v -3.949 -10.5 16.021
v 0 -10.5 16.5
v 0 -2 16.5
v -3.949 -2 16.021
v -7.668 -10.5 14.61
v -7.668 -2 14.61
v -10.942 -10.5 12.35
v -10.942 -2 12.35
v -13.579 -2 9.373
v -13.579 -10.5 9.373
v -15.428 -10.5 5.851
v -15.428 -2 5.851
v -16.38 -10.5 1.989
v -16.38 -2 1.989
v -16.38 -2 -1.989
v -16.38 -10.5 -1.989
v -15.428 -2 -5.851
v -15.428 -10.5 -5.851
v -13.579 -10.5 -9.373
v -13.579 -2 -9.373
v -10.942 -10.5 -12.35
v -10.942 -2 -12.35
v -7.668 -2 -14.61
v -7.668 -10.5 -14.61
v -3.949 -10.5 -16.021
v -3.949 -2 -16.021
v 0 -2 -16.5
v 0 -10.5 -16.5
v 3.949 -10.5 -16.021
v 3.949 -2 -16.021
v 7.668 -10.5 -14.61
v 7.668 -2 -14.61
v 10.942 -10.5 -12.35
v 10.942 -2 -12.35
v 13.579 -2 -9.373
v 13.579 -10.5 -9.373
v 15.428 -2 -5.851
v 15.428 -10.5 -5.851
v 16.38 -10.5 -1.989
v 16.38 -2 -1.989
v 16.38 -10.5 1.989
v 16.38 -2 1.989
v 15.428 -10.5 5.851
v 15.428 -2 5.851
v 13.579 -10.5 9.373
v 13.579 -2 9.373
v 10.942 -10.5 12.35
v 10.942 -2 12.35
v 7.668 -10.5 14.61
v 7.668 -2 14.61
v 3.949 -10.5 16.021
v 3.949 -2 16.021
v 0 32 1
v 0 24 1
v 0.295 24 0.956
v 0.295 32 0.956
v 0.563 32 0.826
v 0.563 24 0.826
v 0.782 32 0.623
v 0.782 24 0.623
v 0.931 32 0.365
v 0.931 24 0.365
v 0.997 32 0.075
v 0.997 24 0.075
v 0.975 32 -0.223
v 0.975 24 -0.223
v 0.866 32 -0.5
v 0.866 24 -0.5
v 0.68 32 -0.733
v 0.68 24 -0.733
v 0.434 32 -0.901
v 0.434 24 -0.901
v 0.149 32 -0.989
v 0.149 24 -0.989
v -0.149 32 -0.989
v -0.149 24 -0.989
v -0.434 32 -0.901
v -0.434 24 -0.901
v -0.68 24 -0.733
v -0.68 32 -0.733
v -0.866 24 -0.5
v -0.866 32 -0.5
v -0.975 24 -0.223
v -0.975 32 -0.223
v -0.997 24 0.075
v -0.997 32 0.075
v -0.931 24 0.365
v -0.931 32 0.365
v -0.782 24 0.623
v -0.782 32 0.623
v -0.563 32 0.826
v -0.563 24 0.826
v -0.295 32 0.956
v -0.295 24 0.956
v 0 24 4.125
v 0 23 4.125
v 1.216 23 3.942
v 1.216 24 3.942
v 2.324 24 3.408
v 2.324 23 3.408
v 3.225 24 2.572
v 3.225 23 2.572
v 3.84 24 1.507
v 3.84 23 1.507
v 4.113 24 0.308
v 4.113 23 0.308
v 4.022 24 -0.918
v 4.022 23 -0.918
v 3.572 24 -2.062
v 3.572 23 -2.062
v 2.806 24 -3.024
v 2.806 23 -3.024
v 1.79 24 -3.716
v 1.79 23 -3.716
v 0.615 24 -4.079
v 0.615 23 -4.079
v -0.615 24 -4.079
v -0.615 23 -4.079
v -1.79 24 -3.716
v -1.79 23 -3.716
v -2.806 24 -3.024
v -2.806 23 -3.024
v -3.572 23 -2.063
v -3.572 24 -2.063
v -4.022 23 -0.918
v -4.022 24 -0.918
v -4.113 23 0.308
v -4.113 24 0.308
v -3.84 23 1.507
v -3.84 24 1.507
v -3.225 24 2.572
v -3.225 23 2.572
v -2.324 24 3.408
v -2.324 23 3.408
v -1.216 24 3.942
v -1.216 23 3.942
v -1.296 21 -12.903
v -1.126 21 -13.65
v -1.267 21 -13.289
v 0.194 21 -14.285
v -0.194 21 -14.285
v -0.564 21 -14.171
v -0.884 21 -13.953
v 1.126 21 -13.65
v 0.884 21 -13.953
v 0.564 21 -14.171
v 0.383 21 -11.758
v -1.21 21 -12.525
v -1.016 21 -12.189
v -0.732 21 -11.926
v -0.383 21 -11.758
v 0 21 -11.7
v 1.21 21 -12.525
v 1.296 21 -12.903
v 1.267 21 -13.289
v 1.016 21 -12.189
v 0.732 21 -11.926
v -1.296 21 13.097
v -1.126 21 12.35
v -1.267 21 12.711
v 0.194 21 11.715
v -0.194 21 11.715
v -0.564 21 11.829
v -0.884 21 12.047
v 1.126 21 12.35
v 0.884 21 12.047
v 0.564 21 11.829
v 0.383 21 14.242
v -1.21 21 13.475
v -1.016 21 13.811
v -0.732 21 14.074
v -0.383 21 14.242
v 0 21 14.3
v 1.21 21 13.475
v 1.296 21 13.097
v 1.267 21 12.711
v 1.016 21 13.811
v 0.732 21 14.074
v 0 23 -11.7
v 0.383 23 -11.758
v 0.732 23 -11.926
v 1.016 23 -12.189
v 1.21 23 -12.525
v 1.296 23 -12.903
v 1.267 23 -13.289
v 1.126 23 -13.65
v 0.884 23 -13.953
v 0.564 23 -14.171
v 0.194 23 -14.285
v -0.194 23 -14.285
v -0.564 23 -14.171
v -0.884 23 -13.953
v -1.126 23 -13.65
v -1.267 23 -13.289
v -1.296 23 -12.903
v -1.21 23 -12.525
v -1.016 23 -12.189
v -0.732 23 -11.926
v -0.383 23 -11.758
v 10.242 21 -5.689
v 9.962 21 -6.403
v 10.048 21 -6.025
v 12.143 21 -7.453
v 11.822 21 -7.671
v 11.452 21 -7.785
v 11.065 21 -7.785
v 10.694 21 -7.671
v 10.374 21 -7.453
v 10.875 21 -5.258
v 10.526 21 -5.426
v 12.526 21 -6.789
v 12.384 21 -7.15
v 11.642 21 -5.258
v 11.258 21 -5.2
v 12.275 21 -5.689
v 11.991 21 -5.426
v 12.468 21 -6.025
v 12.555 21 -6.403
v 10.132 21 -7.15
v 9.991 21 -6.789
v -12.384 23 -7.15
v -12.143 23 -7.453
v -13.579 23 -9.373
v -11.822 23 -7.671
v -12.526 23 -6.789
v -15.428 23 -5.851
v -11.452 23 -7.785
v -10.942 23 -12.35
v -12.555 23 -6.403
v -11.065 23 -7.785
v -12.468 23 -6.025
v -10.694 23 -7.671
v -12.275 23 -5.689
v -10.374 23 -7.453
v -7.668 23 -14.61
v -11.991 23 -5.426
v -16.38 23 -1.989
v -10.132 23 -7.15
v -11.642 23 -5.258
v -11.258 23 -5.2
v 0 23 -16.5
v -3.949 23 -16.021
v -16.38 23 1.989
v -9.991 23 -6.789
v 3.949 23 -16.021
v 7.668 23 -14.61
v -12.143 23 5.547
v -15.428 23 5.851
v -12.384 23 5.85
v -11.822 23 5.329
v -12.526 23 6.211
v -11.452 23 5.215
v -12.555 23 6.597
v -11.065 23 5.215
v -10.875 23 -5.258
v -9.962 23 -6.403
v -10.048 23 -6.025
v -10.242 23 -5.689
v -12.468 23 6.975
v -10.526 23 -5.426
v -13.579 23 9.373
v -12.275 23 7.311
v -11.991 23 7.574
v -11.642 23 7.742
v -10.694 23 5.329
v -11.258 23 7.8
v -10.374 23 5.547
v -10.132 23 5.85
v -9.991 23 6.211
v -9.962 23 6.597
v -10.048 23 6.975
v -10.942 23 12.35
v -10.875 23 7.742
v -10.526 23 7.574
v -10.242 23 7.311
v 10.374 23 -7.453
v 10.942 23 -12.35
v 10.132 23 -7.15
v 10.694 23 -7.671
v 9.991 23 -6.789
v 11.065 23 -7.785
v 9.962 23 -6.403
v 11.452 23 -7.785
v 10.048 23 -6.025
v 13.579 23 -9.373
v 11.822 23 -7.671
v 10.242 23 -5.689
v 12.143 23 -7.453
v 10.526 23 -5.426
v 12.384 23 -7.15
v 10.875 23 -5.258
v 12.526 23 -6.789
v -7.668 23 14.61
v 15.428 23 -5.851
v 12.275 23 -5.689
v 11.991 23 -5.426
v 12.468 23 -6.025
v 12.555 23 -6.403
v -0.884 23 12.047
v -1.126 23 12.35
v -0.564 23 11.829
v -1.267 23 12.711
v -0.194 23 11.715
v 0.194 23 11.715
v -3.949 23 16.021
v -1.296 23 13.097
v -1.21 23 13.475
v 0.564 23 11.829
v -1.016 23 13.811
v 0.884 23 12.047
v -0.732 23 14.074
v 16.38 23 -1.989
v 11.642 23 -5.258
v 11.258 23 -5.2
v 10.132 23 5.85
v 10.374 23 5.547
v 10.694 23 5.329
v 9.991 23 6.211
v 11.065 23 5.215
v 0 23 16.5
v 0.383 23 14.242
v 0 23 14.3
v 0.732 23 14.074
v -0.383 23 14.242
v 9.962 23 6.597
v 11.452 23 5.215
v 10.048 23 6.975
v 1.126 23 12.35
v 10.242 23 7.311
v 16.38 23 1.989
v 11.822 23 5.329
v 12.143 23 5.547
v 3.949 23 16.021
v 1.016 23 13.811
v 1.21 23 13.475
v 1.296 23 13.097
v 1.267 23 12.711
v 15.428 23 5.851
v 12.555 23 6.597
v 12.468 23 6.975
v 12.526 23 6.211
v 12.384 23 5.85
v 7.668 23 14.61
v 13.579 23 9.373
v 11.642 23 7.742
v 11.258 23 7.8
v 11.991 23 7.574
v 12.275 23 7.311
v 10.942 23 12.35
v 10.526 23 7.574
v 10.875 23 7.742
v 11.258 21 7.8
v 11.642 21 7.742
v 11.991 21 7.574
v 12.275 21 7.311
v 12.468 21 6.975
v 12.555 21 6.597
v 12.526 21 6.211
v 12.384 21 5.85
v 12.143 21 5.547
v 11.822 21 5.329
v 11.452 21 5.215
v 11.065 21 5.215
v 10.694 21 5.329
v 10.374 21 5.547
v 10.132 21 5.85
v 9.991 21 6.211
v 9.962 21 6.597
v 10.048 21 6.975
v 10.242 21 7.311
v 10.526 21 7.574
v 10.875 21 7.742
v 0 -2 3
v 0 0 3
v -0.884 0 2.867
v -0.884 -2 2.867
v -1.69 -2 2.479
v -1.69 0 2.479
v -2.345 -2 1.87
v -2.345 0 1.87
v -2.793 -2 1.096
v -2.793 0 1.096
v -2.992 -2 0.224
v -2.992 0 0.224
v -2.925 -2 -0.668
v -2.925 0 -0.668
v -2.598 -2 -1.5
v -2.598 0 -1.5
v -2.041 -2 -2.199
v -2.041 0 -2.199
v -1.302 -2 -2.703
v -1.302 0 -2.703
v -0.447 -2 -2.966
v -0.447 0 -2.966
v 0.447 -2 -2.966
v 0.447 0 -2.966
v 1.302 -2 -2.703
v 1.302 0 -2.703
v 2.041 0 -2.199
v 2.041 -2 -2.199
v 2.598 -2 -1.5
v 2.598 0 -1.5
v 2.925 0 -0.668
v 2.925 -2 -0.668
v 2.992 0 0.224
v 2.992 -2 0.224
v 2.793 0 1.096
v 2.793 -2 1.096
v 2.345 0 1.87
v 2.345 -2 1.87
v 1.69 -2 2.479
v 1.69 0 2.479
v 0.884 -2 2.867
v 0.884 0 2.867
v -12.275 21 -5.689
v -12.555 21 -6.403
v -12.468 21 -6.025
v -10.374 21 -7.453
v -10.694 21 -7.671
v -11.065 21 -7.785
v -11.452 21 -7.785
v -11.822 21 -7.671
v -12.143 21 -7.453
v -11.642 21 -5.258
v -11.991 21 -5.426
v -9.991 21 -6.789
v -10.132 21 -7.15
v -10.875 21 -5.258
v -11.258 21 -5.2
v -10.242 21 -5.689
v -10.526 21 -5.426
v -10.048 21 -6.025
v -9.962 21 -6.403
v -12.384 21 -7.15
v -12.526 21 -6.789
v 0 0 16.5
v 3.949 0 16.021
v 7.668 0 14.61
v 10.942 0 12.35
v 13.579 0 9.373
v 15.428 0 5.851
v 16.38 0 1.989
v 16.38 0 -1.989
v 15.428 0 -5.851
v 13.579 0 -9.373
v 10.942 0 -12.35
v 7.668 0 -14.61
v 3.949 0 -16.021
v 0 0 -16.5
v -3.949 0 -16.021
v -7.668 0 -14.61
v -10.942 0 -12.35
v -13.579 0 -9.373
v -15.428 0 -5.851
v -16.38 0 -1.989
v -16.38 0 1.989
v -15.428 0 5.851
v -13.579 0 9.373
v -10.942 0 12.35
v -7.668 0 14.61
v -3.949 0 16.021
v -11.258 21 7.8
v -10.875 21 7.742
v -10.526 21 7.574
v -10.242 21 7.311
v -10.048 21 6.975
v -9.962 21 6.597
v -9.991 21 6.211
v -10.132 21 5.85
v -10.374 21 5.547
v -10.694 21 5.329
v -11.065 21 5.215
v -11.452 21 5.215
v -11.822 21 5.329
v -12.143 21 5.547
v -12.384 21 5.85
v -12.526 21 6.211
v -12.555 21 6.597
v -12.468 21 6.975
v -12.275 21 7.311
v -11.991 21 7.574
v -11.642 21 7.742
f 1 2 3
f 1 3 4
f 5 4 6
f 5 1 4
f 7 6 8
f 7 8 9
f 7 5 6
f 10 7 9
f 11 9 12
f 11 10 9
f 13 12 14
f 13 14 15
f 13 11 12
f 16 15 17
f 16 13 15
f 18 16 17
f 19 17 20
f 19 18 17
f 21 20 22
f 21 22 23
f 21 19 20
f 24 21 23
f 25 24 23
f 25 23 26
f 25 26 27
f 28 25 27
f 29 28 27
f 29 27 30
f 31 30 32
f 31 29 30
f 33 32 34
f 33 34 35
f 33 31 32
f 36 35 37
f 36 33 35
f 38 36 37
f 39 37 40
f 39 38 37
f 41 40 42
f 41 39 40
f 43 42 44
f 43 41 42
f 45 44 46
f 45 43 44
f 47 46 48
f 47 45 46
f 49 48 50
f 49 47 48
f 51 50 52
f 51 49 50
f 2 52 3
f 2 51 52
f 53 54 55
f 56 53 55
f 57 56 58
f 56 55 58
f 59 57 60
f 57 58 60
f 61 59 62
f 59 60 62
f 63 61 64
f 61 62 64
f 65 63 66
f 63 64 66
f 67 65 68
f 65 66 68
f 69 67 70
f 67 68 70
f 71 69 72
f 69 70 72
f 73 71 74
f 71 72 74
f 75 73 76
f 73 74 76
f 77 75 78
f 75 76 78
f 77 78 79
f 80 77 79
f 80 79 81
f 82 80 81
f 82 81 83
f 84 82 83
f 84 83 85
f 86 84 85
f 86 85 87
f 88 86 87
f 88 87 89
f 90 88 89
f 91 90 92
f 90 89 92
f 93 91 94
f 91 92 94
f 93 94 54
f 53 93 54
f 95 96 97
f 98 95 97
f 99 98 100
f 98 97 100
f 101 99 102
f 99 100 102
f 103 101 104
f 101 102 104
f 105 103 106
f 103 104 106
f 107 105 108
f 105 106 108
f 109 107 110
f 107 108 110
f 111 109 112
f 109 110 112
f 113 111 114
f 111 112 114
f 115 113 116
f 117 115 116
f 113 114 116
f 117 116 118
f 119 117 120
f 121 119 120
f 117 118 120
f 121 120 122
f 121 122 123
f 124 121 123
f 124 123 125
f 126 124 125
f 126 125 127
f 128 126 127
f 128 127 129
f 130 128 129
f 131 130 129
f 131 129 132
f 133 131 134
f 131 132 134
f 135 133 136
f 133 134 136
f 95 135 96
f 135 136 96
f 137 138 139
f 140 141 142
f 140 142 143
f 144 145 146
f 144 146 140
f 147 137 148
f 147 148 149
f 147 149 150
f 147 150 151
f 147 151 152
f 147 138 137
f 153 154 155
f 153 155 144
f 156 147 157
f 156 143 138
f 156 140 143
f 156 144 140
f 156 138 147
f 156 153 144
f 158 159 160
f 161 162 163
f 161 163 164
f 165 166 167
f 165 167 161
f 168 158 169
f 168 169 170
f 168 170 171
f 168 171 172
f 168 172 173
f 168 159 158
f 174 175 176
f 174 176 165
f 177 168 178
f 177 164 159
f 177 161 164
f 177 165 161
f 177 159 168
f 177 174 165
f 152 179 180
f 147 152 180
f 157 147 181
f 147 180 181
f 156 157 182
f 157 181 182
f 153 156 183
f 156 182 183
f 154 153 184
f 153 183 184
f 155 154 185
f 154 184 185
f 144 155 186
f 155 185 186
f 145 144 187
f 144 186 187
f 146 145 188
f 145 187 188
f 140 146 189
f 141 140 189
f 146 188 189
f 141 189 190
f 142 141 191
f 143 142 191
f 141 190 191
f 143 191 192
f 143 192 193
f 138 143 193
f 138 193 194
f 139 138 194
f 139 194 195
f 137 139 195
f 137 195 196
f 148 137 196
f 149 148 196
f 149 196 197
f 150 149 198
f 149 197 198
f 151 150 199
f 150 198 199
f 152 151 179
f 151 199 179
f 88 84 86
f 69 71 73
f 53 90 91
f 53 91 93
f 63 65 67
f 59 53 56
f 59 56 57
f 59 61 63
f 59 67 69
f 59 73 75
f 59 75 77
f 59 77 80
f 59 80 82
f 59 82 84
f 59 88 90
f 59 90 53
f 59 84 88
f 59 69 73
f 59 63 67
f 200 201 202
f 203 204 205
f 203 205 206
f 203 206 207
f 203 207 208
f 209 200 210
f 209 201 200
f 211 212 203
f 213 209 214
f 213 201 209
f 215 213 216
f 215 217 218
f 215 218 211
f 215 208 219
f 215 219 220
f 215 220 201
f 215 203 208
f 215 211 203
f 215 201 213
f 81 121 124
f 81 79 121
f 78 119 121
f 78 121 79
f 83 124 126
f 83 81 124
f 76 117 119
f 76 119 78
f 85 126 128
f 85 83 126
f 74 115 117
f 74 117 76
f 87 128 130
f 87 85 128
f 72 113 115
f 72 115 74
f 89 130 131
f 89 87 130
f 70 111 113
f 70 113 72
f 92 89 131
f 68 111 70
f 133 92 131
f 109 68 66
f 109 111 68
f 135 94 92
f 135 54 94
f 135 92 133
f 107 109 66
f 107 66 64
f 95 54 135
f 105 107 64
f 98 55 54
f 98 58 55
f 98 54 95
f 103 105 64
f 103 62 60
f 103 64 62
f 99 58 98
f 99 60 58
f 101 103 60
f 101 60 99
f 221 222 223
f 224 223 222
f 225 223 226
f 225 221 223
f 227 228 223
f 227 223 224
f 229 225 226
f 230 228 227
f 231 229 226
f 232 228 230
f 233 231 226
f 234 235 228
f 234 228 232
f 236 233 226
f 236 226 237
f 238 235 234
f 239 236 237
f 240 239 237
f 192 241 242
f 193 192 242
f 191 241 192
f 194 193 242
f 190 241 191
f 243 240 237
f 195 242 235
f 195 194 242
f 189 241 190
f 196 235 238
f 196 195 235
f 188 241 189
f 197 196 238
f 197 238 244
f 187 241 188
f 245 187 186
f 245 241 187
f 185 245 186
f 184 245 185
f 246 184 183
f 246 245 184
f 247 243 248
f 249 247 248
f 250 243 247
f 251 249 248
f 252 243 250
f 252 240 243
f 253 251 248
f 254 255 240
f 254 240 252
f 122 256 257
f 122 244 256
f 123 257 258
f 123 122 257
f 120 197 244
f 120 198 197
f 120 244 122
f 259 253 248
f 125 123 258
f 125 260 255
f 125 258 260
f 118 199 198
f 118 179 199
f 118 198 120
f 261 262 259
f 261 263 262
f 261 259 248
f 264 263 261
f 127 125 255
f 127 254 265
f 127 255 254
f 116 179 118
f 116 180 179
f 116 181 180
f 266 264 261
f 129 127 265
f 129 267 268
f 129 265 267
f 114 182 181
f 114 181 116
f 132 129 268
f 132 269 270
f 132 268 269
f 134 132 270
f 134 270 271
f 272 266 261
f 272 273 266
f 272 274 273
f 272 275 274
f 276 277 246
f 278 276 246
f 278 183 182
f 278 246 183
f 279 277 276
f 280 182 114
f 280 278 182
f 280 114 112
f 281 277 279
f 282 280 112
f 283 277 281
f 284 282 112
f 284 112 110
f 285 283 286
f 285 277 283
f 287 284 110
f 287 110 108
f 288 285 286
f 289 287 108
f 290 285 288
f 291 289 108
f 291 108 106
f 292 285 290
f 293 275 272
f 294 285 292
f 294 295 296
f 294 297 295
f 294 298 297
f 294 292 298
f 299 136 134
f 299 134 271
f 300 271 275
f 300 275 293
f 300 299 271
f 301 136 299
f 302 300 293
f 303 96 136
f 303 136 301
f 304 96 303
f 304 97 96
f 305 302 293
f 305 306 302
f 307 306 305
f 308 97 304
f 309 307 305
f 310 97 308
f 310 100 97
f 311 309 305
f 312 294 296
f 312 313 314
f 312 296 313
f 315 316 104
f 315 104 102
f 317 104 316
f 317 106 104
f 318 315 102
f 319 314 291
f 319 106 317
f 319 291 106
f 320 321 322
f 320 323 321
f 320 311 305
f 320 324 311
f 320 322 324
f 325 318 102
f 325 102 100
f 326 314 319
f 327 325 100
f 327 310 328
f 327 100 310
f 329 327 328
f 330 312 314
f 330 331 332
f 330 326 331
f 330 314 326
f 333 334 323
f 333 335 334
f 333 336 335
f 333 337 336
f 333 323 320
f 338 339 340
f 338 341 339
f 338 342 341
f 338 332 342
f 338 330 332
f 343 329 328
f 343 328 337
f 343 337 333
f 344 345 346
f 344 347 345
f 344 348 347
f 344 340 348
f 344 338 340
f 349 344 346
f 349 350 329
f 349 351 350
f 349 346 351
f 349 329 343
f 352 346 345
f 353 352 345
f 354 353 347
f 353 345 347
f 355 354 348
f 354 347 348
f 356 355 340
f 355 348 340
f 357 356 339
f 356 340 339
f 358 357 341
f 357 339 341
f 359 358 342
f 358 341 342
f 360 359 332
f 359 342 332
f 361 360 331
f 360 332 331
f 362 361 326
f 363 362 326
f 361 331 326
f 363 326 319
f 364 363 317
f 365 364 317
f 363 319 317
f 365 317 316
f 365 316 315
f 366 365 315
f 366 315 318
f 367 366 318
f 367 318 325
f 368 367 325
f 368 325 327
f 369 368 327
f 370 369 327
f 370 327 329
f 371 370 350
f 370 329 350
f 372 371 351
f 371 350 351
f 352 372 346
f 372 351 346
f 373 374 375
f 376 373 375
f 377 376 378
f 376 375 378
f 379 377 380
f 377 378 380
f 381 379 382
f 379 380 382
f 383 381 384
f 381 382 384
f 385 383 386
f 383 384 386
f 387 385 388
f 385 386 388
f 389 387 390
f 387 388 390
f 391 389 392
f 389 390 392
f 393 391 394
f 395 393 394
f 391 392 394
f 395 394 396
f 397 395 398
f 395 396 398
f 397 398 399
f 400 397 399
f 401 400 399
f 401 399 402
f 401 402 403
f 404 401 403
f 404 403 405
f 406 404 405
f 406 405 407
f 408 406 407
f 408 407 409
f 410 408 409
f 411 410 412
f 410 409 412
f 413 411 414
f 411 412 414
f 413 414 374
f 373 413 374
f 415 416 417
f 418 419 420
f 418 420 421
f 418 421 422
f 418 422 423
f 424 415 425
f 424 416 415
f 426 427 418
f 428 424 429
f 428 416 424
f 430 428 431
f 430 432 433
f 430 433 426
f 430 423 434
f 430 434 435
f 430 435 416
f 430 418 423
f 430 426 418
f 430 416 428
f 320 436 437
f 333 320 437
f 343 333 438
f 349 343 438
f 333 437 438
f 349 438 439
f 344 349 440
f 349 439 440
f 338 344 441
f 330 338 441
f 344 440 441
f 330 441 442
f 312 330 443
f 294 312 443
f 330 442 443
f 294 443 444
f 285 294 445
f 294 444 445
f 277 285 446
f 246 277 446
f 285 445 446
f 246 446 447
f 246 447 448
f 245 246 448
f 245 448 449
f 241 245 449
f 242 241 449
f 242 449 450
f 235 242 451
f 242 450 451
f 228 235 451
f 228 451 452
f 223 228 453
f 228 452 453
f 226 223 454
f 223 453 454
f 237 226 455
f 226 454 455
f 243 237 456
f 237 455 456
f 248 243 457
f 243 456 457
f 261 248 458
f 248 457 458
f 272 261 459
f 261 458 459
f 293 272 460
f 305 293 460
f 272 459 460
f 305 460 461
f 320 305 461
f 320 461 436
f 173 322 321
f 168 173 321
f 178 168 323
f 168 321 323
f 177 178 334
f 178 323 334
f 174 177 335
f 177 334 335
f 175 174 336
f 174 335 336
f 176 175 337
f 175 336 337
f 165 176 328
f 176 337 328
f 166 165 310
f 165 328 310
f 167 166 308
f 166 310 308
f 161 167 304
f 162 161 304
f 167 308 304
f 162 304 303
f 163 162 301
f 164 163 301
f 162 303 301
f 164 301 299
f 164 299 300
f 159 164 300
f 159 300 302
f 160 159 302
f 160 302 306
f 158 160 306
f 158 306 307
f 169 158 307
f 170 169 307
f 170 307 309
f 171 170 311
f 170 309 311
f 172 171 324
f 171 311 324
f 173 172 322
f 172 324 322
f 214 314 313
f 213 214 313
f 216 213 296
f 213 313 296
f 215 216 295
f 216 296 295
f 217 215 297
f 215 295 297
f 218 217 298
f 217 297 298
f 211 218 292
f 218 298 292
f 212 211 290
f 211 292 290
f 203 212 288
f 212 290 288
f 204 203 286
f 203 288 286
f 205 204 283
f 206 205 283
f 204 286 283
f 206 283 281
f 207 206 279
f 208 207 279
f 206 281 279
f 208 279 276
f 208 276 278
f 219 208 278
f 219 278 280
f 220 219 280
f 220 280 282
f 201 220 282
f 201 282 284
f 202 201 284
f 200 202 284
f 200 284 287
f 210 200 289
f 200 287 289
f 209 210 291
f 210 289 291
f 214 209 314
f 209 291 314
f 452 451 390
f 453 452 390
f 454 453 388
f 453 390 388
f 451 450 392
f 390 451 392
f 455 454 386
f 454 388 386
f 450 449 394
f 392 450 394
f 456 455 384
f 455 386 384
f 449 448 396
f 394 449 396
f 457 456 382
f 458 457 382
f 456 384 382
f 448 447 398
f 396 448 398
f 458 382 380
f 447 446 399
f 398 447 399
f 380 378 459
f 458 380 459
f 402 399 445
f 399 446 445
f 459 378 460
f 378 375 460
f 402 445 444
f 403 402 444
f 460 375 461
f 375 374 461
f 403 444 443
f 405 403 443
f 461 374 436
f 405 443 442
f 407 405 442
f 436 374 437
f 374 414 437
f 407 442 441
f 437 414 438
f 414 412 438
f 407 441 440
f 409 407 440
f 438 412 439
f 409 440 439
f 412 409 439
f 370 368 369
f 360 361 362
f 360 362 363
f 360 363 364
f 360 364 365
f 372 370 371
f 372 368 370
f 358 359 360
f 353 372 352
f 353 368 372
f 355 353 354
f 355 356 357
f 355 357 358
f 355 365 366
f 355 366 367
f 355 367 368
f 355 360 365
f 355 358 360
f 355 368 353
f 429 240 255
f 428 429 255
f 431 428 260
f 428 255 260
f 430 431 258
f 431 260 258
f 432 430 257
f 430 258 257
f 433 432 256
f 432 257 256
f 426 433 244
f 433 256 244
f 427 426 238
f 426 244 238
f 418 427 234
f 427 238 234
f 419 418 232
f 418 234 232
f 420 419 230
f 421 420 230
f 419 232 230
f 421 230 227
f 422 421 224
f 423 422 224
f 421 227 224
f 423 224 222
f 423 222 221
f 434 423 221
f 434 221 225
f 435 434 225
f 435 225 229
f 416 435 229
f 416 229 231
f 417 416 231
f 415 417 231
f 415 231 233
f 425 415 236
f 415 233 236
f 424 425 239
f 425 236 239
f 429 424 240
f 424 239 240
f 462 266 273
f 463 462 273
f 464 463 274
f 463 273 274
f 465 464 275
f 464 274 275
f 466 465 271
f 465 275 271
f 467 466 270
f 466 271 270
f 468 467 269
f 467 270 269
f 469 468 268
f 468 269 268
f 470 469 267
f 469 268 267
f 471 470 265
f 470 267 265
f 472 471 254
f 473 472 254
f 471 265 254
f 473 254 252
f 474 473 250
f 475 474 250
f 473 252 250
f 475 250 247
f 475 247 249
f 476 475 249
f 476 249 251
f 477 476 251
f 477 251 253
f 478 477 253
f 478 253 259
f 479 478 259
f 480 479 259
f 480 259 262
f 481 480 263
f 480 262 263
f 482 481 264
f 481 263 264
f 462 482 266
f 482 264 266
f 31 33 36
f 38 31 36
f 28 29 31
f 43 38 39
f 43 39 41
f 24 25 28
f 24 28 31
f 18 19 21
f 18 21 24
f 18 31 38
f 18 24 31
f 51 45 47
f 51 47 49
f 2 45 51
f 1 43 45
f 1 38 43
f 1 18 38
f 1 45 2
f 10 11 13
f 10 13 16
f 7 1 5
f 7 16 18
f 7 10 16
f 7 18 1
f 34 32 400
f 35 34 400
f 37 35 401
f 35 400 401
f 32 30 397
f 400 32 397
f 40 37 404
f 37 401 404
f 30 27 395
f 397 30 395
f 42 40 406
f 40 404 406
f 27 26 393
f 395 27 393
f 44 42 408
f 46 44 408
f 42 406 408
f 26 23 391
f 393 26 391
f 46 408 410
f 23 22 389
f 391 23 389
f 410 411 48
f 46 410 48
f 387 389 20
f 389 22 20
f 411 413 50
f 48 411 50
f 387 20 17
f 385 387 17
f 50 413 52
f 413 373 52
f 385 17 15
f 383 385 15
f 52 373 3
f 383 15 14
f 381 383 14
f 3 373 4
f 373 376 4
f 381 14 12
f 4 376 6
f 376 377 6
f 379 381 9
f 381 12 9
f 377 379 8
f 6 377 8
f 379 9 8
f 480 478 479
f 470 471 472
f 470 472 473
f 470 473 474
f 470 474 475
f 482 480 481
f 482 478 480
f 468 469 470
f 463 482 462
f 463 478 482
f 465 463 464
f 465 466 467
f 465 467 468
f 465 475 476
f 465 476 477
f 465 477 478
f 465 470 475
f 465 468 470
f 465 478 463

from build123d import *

# Parameters (mm, degrees)
SKETCH_1_R          = 16.5
EXTRUDE_1_DEPTH     = 23
SKETCH_2_R          = 4.125
EXTRUDE_2_DEPTH     = 1
SKETCH_3_R          = 1
EXTRUDE_3_DEPTH     = 8
SKETCH_4_R          = 3
EXTRUDE_4_DEPTH     = 2
EXTRUDE_START       = 8.5
SKETCH_5_R          = 16.5
EXTRUDE_5_DEPTH     = 8.5
SKETCH_6_R          = 1.3
CUT_EXTRUDE_1_DEPTH = 2


with BuildPart() as part:
    # 草图1 → 凸台-拉伸1 (new body)
    with BuildSketch(Plane(origin=(0, 0, 0), x_dir=(1, 0, 0), z_dir=(0, 1, 0))):
        with Locations(Location((0, 0, 0), (0, 0, 270))):
            Circle(SKETCH_1_R)
    extrude(amount=EXTRUDE_1_DEPTH)

    # 草图2 → 凸台-拉伸2 (add)
    with BuildSketch(Plane(origin=(0, 23, 0), x_dir=(1, 0, 0), z_dir=(0, 1, 0))):
        with Locations(Location((0, 0, 0), (0, 0, 270))):
            Circle(SKETCH_2_R)
    extrude(amount=EXTRUDE_2_DEPTH)

    # 草图3 → 凸台-拉伸3 (add)
    with BuildSketch(Plane(origin=(0, 24, 0), x_dir=(1, 0, 0), z_dir=(0, 1, 0))):
        with Locations(Location((0, 0, 0), (0, 0, 270))):
            Circle(SKETCH_3_R)
    extrude(amount=EXTRUDE_3_DEPTH)

    # 草图4 → 凸台-拉伸4 (add)
    with BuildSketch(Plane.XZ):
        with Locations(Location((0, 0, 0), (0, 0, 90))):
            Circle(SKETCH_4_R)
    extrude(amount=EXTRUDE_4_DEPTH)

    # 草图5 → 凸台-拉伸5 (add)
    with BuildSketch(Plane(origin=(0, -2, 0), x_dir=(-1, 0, 0), z_dir=(0, -1, 0)).offset(EXTRUDE_START)):
        with Locations(Location((0, 0, 0), (0, 0, 270))):
            Circle(SKETCH_5_R)
    extrude(amount=-EXTRUDE_5_DEPTH)

    # 草图6 → 切除-拉伸1 (cut)
    with BuildSketch(Plane(origin=(0, 23, 0), x_dir=(1, 0, 0), z_dir=(0, 1, 0))):
        with Locations(Location((-11.258330249, -6.5, 0), (0, 0, 270))):
            Circle(SKETCH_6_R)
        with Locations(Location((0, -13, 0), (0, 0, 270))):
            Circle(SKETCH_6_R)
        with Locations(Location((11.258330249, -6.5, 0), (0, 0, 270))):
            Circle(SKETCH_6_R)
        with Locations(Location((11.258330249, 6.5, 0), (0, 0, 270))):
            Circle(SKETCH_6_R)
        with Locations(Location((0, 13, 0), (0, 0, 270))):
            Circle(SKETCH_6_R)
        with Locations(Location((-11.258330249, 6.5, 0), (0, 0, 270))):
            Circle(SKETCH_6_R)
    extrude(amount=-CUT_EXTRUDE_1_DEPTH, mode=Mode.SUBTRACT)


solid = part.part
